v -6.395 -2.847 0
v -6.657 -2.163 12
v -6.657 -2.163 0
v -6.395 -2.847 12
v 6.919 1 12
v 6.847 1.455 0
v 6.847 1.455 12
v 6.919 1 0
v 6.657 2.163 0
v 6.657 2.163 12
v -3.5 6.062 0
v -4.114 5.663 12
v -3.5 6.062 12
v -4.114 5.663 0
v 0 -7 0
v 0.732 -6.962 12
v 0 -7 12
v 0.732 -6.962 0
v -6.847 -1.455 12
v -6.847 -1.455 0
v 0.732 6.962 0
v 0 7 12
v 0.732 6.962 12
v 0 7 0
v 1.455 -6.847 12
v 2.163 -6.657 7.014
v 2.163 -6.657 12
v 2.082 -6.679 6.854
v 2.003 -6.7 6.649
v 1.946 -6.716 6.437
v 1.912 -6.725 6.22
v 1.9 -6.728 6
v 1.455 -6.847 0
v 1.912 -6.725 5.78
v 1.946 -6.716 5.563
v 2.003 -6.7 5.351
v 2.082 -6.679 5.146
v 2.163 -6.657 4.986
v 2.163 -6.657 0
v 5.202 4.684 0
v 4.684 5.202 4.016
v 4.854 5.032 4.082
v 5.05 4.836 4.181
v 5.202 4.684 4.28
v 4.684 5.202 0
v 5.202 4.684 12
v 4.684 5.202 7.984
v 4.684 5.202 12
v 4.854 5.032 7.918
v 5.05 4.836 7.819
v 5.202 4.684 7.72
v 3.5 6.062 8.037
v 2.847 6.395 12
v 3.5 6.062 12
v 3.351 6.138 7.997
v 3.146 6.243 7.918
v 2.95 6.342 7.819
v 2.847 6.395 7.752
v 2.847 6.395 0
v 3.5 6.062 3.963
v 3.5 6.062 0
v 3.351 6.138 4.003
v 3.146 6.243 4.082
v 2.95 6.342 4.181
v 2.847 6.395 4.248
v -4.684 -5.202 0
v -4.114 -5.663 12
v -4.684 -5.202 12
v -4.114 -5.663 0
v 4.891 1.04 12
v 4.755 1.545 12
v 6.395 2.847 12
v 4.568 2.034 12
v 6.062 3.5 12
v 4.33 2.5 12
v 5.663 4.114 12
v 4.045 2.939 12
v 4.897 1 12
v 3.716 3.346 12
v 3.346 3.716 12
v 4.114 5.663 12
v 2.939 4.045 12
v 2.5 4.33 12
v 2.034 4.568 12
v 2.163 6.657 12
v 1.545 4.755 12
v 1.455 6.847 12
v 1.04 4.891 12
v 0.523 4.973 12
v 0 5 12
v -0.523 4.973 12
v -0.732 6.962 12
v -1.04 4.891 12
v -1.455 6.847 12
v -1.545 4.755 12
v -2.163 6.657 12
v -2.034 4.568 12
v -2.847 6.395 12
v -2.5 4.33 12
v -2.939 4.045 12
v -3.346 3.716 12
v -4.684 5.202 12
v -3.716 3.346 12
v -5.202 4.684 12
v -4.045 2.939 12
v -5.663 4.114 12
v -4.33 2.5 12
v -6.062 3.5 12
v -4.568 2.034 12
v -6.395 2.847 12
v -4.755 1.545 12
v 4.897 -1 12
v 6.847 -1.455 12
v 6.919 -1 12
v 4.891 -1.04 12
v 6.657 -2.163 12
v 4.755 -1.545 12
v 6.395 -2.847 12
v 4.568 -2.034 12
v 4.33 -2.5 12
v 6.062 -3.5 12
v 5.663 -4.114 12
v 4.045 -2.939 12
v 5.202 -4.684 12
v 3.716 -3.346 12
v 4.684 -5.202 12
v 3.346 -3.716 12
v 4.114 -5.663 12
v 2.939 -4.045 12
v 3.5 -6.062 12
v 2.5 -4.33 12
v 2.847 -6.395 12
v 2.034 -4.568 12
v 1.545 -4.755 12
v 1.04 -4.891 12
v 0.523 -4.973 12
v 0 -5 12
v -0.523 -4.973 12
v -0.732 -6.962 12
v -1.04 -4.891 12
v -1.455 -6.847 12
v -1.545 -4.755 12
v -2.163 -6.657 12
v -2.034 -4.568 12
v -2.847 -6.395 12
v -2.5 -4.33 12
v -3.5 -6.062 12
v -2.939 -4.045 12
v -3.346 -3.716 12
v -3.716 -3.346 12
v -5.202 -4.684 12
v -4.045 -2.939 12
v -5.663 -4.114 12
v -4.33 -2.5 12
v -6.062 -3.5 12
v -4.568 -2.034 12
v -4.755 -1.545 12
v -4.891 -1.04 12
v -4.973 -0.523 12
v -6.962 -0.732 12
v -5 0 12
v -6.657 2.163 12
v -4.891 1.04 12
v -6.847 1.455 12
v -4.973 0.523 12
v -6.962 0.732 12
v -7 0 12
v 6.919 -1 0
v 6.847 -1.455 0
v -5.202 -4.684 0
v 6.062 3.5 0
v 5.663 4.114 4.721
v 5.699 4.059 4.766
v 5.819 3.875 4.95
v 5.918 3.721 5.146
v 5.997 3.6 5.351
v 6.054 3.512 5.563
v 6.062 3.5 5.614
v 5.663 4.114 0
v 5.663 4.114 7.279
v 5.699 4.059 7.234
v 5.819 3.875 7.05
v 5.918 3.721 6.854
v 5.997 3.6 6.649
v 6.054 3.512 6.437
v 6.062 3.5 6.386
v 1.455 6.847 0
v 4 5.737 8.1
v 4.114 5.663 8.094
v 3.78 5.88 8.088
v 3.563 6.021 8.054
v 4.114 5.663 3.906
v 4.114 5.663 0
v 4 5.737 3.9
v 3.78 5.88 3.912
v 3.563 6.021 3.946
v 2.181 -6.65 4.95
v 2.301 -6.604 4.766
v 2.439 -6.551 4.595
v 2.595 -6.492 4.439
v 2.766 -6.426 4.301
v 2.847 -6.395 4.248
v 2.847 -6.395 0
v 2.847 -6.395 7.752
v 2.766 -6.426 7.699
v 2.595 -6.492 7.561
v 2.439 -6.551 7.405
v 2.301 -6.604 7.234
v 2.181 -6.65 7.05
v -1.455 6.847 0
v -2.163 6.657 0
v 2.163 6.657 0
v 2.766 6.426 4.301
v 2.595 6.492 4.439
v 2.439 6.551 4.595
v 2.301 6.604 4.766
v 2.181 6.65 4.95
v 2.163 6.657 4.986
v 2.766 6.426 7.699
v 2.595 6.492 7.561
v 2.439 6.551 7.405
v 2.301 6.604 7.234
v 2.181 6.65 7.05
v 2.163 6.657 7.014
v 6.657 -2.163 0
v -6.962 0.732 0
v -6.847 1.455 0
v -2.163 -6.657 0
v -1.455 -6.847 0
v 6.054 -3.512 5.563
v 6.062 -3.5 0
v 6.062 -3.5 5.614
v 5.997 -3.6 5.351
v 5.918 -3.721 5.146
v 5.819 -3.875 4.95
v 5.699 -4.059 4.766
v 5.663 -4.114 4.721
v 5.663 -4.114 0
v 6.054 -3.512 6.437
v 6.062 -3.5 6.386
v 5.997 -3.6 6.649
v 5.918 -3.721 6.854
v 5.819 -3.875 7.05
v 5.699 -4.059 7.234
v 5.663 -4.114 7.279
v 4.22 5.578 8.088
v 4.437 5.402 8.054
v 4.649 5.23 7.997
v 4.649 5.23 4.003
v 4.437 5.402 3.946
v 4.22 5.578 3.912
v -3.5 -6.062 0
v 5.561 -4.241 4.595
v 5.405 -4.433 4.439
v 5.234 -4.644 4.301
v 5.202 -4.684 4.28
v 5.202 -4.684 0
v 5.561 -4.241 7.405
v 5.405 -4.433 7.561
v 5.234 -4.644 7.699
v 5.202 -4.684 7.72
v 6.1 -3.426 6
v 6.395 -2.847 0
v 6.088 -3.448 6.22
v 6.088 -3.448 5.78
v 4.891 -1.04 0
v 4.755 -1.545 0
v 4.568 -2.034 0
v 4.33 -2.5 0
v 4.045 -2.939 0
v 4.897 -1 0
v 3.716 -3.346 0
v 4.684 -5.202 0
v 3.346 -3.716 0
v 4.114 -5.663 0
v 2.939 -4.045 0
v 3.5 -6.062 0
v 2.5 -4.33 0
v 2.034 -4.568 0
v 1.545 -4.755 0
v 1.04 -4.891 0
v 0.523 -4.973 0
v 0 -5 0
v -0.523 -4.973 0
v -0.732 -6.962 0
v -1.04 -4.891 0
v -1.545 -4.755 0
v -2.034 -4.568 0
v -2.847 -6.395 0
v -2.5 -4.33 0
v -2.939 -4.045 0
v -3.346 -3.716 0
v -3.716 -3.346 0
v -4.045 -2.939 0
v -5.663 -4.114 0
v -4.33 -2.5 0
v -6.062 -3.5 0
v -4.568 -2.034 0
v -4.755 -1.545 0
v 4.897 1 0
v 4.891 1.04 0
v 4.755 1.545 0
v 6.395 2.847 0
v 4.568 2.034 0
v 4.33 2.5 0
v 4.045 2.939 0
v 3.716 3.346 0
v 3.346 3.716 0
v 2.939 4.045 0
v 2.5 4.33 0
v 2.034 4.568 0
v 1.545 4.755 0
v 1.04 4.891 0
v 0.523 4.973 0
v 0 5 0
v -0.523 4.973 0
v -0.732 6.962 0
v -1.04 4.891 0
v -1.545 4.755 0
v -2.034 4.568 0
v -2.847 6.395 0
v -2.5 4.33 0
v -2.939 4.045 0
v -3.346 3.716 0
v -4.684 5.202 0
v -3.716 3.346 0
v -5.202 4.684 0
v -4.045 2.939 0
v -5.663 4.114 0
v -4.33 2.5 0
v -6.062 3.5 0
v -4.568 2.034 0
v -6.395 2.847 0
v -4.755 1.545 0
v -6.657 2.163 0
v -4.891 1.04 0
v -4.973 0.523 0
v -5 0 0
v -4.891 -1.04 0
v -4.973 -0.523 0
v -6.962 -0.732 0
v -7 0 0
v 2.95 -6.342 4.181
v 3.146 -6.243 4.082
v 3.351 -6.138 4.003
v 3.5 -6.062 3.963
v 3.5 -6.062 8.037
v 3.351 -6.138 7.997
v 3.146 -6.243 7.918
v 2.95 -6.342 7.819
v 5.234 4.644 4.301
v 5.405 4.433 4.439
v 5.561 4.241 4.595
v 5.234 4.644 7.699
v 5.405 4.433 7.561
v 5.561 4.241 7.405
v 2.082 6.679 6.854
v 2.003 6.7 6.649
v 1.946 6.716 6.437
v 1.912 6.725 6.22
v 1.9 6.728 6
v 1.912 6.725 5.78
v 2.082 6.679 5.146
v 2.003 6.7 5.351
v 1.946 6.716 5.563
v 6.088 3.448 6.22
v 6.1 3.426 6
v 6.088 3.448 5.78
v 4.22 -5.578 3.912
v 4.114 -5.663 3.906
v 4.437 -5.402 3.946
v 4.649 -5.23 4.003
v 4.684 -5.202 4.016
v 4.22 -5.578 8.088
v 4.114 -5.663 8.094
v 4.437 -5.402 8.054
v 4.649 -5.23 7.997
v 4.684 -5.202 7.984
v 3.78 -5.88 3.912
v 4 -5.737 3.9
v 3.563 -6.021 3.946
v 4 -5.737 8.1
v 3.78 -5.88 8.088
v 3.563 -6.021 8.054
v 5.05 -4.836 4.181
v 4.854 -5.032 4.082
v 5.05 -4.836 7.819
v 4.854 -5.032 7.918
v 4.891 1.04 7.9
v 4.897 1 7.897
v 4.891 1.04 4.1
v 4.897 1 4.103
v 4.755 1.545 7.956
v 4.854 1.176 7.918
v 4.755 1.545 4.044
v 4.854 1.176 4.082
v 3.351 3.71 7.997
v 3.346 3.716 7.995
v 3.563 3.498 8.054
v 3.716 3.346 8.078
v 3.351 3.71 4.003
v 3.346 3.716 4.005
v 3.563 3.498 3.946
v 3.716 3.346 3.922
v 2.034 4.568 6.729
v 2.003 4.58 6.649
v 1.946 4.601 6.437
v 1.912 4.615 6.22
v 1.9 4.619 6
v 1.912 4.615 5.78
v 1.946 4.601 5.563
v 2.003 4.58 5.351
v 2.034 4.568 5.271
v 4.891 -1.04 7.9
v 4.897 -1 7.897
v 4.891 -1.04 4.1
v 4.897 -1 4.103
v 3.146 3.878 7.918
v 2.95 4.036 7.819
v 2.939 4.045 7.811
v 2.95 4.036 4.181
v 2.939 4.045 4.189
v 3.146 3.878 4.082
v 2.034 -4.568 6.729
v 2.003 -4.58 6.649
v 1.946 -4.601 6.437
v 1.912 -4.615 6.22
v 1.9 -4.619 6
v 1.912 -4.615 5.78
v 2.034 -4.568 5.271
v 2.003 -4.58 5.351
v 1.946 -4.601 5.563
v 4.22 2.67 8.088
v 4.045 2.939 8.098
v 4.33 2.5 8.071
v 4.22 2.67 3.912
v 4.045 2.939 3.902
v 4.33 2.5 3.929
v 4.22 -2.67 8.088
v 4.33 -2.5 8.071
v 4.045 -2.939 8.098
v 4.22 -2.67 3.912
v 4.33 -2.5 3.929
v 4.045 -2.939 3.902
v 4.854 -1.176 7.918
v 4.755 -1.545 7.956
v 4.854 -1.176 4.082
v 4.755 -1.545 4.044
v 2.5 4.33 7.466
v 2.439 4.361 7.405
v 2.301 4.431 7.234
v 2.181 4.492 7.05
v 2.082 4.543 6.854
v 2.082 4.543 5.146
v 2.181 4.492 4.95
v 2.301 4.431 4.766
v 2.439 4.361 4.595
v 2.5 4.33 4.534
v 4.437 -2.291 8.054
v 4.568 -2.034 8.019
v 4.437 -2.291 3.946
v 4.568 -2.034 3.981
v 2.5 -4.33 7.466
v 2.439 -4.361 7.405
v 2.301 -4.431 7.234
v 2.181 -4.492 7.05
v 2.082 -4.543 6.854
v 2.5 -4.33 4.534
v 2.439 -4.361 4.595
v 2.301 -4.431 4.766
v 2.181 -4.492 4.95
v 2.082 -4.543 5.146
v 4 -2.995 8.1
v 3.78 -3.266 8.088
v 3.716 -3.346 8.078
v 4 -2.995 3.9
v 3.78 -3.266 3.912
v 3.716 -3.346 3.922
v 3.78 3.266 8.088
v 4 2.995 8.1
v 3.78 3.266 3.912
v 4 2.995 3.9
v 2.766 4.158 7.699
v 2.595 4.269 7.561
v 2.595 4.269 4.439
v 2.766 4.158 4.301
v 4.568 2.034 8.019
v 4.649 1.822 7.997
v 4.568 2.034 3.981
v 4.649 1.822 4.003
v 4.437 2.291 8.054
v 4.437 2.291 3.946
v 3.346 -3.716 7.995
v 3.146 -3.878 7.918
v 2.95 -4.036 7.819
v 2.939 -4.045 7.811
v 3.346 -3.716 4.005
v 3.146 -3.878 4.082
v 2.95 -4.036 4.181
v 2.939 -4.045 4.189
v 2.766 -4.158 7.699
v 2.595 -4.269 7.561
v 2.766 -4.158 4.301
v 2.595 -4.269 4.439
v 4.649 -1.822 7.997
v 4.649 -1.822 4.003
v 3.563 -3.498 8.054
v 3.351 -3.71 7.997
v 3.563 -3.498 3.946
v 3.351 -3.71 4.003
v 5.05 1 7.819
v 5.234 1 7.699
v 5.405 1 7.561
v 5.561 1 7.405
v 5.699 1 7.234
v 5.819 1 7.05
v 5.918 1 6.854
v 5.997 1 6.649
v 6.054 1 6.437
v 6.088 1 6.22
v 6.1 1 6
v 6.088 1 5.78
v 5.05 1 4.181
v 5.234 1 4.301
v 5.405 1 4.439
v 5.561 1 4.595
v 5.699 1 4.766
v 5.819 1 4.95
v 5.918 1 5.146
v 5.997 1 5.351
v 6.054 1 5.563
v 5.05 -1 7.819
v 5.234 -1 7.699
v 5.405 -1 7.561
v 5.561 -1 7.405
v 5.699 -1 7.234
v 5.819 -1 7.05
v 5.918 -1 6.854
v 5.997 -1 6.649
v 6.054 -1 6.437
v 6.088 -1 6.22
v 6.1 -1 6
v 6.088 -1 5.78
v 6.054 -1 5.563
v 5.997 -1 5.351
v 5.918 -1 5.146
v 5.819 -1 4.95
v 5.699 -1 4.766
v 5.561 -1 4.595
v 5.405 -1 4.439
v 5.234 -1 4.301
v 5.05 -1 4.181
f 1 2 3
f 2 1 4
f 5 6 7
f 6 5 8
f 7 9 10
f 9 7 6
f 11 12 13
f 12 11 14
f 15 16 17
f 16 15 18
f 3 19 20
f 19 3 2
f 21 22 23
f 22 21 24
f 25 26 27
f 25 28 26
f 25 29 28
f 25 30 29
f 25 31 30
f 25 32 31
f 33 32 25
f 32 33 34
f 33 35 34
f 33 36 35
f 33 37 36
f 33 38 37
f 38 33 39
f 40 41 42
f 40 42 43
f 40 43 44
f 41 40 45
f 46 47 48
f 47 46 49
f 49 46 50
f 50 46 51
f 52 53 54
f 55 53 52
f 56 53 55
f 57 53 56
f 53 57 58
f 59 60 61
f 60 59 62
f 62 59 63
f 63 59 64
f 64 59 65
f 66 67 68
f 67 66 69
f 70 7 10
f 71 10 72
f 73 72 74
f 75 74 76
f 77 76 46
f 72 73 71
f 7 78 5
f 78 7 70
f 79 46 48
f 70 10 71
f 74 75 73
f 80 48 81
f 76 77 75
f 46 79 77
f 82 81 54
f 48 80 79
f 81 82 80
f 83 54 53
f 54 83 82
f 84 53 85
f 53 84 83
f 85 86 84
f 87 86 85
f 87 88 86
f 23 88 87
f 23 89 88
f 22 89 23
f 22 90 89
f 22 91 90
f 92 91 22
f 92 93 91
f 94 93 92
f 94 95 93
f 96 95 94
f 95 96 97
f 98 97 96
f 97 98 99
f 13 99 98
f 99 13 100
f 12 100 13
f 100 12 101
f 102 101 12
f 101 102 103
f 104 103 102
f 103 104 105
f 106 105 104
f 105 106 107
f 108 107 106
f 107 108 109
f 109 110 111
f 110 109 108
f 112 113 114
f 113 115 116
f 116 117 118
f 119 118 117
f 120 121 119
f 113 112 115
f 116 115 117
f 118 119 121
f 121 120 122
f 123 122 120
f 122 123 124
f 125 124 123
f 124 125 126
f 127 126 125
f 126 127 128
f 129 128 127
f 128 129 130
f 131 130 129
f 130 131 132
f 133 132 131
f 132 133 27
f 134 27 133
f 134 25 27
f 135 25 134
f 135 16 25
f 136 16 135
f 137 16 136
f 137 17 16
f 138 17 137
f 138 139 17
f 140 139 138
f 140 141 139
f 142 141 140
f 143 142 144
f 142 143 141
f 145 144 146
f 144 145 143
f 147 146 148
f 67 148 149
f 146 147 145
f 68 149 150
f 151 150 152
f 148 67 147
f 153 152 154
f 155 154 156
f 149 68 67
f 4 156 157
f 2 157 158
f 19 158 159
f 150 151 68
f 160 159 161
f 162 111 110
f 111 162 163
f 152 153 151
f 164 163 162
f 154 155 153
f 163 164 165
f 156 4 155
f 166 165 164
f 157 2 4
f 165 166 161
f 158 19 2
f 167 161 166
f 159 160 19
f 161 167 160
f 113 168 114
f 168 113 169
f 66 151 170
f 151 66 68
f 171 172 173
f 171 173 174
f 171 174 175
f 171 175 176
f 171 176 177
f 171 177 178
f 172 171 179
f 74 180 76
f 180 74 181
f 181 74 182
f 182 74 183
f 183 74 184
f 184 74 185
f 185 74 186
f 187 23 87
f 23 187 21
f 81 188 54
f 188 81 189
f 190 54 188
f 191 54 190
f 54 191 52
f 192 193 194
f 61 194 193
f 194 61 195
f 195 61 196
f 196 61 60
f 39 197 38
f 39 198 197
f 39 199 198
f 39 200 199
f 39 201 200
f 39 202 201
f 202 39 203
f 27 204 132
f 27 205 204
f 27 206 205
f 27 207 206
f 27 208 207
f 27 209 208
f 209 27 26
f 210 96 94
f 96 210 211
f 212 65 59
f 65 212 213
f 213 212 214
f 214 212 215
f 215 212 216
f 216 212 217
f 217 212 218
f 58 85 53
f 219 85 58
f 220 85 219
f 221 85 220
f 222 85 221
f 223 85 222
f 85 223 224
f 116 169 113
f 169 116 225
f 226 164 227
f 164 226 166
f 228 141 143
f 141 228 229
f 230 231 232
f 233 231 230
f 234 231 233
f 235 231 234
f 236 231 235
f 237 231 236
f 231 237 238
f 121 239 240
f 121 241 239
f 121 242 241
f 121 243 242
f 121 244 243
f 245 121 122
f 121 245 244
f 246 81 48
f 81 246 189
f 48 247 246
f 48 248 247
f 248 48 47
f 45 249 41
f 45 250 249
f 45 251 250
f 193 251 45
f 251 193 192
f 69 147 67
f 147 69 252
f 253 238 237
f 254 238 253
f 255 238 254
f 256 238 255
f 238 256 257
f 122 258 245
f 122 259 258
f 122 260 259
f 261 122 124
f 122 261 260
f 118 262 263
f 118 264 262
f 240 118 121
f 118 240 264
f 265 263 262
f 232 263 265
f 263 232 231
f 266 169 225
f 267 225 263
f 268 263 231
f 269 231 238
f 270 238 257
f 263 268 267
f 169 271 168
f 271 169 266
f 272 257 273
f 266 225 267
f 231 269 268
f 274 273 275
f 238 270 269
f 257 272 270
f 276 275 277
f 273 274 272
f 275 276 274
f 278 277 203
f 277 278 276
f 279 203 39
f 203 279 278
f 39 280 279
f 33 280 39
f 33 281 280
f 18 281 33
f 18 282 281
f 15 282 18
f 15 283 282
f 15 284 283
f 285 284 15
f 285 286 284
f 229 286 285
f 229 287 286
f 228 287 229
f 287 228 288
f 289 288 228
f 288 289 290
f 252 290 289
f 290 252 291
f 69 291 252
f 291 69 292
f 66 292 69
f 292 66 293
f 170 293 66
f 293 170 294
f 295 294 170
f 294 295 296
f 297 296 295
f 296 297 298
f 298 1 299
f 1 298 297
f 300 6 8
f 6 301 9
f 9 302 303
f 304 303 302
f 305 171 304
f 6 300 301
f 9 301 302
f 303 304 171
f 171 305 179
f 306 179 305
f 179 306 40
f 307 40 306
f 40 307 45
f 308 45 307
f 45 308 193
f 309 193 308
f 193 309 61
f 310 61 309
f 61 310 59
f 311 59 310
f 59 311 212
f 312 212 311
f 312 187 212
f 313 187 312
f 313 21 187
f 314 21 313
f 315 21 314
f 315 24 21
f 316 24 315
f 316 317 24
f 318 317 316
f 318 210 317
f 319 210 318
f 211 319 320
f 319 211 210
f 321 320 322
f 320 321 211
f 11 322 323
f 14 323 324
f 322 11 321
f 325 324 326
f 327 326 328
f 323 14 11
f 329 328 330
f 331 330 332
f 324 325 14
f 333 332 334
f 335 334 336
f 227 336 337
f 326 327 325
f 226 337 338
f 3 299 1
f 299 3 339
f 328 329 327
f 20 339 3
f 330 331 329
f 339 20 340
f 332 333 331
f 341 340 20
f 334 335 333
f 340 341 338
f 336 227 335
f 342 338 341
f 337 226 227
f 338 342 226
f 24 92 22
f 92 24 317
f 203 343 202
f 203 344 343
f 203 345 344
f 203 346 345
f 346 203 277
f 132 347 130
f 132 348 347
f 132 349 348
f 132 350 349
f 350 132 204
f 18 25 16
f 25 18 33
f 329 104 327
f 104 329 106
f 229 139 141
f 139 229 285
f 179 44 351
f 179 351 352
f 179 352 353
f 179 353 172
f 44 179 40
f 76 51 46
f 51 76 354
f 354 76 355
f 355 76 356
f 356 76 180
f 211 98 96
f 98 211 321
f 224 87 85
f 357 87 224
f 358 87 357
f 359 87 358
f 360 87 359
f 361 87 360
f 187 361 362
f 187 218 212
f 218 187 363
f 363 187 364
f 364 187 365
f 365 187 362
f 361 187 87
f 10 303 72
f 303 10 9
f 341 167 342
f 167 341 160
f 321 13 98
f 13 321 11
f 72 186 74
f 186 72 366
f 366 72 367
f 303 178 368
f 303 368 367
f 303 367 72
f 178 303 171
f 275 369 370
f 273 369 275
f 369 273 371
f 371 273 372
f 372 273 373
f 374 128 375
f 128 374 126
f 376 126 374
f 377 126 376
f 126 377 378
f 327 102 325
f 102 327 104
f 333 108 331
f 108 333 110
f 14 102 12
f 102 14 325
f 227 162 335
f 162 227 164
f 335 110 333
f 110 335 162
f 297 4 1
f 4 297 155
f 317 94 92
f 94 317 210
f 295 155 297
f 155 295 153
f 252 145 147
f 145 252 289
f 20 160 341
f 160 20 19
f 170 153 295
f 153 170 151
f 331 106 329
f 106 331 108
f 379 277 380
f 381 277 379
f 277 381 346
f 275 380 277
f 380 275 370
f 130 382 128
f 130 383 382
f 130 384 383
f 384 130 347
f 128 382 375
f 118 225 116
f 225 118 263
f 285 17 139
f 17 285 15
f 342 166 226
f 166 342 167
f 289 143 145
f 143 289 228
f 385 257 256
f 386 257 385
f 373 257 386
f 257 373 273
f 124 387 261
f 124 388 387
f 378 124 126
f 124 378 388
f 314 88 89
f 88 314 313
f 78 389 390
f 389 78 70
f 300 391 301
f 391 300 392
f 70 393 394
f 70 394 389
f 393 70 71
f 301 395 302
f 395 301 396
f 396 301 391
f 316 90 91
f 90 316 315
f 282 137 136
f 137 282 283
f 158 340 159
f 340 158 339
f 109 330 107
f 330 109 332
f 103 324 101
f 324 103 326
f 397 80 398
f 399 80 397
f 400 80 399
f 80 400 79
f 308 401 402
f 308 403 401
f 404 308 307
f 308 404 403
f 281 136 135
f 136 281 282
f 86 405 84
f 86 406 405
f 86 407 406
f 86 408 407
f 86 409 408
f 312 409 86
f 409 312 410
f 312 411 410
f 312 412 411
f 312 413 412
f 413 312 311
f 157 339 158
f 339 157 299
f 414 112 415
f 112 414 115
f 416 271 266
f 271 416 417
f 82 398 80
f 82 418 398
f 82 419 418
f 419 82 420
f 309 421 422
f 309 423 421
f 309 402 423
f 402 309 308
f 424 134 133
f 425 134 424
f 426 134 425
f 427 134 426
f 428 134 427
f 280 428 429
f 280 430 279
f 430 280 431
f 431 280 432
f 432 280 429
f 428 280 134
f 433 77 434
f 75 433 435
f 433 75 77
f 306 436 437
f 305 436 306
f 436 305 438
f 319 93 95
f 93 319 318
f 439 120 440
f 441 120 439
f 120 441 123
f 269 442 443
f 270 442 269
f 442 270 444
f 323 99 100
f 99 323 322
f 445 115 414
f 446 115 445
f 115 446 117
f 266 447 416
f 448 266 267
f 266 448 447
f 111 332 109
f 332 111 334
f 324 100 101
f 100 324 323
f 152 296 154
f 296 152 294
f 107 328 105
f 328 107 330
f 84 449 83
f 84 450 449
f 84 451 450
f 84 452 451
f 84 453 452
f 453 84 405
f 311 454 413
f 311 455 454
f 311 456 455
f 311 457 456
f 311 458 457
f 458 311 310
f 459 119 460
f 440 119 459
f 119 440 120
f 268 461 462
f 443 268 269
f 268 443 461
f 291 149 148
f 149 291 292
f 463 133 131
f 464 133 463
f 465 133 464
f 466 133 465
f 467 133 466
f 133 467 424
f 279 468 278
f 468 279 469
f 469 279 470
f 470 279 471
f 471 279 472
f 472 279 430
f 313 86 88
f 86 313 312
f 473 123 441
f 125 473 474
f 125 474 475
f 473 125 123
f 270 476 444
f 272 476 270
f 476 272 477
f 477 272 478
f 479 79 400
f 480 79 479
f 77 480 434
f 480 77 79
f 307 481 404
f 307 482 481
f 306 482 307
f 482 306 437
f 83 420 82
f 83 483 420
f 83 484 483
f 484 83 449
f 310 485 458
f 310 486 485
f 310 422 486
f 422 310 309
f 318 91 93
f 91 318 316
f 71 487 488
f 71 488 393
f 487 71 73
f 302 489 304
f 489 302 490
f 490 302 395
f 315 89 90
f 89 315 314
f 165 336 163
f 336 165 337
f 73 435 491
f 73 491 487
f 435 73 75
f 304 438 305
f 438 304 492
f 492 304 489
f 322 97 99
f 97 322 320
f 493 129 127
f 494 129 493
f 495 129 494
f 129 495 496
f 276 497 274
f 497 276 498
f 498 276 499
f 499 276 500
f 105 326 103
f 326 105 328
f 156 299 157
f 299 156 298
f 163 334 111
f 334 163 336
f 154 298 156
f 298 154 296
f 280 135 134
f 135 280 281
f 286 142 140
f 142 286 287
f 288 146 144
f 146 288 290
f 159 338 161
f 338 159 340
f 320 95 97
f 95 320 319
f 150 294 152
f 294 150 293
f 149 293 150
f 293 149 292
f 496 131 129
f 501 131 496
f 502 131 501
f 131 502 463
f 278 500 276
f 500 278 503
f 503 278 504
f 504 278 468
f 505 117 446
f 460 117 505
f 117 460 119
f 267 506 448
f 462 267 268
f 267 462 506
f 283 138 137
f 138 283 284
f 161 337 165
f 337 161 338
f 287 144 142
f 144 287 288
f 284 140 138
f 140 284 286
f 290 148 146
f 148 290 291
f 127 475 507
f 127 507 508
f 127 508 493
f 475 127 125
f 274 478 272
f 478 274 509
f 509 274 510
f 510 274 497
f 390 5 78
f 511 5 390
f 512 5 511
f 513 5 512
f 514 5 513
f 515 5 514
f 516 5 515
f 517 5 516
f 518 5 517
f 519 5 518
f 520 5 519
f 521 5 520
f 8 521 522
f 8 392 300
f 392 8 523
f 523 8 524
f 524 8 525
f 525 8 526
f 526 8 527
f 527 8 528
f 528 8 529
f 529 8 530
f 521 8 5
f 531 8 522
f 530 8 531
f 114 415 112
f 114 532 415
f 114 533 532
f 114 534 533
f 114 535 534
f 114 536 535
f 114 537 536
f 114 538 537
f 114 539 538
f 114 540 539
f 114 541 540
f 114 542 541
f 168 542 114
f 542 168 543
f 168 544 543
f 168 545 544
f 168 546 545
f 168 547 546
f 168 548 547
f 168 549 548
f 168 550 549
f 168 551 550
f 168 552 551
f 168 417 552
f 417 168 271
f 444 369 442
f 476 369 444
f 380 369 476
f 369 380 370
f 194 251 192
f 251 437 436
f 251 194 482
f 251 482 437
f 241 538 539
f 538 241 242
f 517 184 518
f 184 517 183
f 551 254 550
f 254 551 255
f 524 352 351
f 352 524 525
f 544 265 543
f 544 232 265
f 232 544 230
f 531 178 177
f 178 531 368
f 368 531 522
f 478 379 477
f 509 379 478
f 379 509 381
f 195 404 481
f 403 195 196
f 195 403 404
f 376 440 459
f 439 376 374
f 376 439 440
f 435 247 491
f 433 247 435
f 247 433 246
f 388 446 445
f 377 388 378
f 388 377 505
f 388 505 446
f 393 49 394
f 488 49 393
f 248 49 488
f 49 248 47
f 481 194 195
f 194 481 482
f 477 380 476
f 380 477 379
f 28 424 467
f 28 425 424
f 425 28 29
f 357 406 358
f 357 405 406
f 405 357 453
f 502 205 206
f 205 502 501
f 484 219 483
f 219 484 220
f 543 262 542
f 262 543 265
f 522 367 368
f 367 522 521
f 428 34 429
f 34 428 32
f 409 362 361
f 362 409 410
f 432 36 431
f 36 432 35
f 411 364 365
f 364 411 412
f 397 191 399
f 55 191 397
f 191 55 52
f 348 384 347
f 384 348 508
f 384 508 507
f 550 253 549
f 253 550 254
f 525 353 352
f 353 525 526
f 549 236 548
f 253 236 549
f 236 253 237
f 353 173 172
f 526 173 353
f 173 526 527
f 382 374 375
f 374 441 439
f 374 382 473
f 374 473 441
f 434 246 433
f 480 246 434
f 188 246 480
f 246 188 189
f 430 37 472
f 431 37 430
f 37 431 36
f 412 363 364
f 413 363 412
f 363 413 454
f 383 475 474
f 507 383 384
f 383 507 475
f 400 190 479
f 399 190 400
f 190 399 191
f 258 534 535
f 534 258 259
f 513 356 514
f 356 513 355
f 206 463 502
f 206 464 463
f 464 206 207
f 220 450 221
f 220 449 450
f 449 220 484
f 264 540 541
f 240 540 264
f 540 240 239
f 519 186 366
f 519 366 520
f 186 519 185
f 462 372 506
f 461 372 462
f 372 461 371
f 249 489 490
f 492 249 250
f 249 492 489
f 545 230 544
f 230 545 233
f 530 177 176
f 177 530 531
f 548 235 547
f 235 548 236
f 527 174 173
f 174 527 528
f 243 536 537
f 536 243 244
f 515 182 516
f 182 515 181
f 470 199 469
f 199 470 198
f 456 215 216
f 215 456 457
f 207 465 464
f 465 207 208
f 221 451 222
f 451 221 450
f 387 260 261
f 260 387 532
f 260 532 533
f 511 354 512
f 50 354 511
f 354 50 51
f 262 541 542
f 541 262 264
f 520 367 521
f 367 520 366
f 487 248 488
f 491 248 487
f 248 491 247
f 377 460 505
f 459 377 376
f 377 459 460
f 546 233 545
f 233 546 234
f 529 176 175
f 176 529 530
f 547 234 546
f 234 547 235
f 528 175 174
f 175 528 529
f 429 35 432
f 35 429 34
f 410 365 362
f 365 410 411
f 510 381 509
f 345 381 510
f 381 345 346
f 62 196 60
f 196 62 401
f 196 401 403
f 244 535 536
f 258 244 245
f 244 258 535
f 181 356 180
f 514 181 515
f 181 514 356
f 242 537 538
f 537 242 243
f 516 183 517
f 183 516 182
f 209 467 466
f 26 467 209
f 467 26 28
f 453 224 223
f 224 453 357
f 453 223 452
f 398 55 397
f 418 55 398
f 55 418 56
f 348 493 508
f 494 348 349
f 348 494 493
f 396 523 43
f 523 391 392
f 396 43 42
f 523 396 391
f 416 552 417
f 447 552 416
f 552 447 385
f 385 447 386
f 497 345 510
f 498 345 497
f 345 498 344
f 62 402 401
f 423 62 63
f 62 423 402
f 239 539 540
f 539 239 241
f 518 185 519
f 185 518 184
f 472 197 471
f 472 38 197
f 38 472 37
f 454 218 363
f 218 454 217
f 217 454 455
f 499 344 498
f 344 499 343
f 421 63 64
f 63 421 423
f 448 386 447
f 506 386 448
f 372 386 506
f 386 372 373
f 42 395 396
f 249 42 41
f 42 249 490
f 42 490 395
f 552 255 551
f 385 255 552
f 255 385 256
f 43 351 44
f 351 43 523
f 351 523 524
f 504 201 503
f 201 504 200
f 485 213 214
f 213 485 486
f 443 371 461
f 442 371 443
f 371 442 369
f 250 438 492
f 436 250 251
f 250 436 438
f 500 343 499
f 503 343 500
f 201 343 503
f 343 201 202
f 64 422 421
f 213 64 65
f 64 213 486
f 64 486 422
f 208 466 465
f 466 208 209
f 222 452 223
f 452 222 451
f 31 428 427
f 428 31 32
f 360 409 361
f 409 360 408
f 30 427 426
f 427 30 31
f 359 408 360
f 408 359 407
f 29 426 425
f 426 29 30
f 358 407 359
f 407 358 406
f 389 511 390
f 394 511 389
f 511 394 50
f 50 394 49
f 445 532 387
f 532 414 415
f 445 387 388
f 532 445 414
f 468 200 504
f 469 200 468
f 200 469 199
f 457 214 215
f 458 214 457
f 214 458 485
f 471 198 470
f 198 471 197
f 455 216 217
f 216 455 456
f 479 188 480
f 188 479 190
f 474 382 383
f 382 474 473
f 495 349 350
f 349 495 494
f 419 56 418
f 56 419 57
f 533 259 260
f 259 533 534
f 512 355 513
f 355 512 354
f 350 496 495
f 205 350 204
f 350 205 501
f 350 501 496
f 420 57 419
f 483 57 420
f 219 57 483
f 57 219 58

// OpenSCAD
// C-style pipe clamp.
$fn = 60;
eps = 0.02;
pipe_d = 10;
wall = 2;
outer_d = pipe_d + 2 * wall;
width = 12;
slit = 2;
difference() {
    cylinder(d=outer_d,h=width);
    translate([0,0,-eps]) cylinder(d=pipe_d,h=width+2*eps);
    translate([0,-slit/2,-eps]) cube([outer_d/2+eps,slit,width+2*eps]);
    translate([outer_d/2-3,-outer_d/2-eps,width/2]) rotate([-90,0,0]) cylinder(d=4.2,h=outer_d+2*eps);
}
